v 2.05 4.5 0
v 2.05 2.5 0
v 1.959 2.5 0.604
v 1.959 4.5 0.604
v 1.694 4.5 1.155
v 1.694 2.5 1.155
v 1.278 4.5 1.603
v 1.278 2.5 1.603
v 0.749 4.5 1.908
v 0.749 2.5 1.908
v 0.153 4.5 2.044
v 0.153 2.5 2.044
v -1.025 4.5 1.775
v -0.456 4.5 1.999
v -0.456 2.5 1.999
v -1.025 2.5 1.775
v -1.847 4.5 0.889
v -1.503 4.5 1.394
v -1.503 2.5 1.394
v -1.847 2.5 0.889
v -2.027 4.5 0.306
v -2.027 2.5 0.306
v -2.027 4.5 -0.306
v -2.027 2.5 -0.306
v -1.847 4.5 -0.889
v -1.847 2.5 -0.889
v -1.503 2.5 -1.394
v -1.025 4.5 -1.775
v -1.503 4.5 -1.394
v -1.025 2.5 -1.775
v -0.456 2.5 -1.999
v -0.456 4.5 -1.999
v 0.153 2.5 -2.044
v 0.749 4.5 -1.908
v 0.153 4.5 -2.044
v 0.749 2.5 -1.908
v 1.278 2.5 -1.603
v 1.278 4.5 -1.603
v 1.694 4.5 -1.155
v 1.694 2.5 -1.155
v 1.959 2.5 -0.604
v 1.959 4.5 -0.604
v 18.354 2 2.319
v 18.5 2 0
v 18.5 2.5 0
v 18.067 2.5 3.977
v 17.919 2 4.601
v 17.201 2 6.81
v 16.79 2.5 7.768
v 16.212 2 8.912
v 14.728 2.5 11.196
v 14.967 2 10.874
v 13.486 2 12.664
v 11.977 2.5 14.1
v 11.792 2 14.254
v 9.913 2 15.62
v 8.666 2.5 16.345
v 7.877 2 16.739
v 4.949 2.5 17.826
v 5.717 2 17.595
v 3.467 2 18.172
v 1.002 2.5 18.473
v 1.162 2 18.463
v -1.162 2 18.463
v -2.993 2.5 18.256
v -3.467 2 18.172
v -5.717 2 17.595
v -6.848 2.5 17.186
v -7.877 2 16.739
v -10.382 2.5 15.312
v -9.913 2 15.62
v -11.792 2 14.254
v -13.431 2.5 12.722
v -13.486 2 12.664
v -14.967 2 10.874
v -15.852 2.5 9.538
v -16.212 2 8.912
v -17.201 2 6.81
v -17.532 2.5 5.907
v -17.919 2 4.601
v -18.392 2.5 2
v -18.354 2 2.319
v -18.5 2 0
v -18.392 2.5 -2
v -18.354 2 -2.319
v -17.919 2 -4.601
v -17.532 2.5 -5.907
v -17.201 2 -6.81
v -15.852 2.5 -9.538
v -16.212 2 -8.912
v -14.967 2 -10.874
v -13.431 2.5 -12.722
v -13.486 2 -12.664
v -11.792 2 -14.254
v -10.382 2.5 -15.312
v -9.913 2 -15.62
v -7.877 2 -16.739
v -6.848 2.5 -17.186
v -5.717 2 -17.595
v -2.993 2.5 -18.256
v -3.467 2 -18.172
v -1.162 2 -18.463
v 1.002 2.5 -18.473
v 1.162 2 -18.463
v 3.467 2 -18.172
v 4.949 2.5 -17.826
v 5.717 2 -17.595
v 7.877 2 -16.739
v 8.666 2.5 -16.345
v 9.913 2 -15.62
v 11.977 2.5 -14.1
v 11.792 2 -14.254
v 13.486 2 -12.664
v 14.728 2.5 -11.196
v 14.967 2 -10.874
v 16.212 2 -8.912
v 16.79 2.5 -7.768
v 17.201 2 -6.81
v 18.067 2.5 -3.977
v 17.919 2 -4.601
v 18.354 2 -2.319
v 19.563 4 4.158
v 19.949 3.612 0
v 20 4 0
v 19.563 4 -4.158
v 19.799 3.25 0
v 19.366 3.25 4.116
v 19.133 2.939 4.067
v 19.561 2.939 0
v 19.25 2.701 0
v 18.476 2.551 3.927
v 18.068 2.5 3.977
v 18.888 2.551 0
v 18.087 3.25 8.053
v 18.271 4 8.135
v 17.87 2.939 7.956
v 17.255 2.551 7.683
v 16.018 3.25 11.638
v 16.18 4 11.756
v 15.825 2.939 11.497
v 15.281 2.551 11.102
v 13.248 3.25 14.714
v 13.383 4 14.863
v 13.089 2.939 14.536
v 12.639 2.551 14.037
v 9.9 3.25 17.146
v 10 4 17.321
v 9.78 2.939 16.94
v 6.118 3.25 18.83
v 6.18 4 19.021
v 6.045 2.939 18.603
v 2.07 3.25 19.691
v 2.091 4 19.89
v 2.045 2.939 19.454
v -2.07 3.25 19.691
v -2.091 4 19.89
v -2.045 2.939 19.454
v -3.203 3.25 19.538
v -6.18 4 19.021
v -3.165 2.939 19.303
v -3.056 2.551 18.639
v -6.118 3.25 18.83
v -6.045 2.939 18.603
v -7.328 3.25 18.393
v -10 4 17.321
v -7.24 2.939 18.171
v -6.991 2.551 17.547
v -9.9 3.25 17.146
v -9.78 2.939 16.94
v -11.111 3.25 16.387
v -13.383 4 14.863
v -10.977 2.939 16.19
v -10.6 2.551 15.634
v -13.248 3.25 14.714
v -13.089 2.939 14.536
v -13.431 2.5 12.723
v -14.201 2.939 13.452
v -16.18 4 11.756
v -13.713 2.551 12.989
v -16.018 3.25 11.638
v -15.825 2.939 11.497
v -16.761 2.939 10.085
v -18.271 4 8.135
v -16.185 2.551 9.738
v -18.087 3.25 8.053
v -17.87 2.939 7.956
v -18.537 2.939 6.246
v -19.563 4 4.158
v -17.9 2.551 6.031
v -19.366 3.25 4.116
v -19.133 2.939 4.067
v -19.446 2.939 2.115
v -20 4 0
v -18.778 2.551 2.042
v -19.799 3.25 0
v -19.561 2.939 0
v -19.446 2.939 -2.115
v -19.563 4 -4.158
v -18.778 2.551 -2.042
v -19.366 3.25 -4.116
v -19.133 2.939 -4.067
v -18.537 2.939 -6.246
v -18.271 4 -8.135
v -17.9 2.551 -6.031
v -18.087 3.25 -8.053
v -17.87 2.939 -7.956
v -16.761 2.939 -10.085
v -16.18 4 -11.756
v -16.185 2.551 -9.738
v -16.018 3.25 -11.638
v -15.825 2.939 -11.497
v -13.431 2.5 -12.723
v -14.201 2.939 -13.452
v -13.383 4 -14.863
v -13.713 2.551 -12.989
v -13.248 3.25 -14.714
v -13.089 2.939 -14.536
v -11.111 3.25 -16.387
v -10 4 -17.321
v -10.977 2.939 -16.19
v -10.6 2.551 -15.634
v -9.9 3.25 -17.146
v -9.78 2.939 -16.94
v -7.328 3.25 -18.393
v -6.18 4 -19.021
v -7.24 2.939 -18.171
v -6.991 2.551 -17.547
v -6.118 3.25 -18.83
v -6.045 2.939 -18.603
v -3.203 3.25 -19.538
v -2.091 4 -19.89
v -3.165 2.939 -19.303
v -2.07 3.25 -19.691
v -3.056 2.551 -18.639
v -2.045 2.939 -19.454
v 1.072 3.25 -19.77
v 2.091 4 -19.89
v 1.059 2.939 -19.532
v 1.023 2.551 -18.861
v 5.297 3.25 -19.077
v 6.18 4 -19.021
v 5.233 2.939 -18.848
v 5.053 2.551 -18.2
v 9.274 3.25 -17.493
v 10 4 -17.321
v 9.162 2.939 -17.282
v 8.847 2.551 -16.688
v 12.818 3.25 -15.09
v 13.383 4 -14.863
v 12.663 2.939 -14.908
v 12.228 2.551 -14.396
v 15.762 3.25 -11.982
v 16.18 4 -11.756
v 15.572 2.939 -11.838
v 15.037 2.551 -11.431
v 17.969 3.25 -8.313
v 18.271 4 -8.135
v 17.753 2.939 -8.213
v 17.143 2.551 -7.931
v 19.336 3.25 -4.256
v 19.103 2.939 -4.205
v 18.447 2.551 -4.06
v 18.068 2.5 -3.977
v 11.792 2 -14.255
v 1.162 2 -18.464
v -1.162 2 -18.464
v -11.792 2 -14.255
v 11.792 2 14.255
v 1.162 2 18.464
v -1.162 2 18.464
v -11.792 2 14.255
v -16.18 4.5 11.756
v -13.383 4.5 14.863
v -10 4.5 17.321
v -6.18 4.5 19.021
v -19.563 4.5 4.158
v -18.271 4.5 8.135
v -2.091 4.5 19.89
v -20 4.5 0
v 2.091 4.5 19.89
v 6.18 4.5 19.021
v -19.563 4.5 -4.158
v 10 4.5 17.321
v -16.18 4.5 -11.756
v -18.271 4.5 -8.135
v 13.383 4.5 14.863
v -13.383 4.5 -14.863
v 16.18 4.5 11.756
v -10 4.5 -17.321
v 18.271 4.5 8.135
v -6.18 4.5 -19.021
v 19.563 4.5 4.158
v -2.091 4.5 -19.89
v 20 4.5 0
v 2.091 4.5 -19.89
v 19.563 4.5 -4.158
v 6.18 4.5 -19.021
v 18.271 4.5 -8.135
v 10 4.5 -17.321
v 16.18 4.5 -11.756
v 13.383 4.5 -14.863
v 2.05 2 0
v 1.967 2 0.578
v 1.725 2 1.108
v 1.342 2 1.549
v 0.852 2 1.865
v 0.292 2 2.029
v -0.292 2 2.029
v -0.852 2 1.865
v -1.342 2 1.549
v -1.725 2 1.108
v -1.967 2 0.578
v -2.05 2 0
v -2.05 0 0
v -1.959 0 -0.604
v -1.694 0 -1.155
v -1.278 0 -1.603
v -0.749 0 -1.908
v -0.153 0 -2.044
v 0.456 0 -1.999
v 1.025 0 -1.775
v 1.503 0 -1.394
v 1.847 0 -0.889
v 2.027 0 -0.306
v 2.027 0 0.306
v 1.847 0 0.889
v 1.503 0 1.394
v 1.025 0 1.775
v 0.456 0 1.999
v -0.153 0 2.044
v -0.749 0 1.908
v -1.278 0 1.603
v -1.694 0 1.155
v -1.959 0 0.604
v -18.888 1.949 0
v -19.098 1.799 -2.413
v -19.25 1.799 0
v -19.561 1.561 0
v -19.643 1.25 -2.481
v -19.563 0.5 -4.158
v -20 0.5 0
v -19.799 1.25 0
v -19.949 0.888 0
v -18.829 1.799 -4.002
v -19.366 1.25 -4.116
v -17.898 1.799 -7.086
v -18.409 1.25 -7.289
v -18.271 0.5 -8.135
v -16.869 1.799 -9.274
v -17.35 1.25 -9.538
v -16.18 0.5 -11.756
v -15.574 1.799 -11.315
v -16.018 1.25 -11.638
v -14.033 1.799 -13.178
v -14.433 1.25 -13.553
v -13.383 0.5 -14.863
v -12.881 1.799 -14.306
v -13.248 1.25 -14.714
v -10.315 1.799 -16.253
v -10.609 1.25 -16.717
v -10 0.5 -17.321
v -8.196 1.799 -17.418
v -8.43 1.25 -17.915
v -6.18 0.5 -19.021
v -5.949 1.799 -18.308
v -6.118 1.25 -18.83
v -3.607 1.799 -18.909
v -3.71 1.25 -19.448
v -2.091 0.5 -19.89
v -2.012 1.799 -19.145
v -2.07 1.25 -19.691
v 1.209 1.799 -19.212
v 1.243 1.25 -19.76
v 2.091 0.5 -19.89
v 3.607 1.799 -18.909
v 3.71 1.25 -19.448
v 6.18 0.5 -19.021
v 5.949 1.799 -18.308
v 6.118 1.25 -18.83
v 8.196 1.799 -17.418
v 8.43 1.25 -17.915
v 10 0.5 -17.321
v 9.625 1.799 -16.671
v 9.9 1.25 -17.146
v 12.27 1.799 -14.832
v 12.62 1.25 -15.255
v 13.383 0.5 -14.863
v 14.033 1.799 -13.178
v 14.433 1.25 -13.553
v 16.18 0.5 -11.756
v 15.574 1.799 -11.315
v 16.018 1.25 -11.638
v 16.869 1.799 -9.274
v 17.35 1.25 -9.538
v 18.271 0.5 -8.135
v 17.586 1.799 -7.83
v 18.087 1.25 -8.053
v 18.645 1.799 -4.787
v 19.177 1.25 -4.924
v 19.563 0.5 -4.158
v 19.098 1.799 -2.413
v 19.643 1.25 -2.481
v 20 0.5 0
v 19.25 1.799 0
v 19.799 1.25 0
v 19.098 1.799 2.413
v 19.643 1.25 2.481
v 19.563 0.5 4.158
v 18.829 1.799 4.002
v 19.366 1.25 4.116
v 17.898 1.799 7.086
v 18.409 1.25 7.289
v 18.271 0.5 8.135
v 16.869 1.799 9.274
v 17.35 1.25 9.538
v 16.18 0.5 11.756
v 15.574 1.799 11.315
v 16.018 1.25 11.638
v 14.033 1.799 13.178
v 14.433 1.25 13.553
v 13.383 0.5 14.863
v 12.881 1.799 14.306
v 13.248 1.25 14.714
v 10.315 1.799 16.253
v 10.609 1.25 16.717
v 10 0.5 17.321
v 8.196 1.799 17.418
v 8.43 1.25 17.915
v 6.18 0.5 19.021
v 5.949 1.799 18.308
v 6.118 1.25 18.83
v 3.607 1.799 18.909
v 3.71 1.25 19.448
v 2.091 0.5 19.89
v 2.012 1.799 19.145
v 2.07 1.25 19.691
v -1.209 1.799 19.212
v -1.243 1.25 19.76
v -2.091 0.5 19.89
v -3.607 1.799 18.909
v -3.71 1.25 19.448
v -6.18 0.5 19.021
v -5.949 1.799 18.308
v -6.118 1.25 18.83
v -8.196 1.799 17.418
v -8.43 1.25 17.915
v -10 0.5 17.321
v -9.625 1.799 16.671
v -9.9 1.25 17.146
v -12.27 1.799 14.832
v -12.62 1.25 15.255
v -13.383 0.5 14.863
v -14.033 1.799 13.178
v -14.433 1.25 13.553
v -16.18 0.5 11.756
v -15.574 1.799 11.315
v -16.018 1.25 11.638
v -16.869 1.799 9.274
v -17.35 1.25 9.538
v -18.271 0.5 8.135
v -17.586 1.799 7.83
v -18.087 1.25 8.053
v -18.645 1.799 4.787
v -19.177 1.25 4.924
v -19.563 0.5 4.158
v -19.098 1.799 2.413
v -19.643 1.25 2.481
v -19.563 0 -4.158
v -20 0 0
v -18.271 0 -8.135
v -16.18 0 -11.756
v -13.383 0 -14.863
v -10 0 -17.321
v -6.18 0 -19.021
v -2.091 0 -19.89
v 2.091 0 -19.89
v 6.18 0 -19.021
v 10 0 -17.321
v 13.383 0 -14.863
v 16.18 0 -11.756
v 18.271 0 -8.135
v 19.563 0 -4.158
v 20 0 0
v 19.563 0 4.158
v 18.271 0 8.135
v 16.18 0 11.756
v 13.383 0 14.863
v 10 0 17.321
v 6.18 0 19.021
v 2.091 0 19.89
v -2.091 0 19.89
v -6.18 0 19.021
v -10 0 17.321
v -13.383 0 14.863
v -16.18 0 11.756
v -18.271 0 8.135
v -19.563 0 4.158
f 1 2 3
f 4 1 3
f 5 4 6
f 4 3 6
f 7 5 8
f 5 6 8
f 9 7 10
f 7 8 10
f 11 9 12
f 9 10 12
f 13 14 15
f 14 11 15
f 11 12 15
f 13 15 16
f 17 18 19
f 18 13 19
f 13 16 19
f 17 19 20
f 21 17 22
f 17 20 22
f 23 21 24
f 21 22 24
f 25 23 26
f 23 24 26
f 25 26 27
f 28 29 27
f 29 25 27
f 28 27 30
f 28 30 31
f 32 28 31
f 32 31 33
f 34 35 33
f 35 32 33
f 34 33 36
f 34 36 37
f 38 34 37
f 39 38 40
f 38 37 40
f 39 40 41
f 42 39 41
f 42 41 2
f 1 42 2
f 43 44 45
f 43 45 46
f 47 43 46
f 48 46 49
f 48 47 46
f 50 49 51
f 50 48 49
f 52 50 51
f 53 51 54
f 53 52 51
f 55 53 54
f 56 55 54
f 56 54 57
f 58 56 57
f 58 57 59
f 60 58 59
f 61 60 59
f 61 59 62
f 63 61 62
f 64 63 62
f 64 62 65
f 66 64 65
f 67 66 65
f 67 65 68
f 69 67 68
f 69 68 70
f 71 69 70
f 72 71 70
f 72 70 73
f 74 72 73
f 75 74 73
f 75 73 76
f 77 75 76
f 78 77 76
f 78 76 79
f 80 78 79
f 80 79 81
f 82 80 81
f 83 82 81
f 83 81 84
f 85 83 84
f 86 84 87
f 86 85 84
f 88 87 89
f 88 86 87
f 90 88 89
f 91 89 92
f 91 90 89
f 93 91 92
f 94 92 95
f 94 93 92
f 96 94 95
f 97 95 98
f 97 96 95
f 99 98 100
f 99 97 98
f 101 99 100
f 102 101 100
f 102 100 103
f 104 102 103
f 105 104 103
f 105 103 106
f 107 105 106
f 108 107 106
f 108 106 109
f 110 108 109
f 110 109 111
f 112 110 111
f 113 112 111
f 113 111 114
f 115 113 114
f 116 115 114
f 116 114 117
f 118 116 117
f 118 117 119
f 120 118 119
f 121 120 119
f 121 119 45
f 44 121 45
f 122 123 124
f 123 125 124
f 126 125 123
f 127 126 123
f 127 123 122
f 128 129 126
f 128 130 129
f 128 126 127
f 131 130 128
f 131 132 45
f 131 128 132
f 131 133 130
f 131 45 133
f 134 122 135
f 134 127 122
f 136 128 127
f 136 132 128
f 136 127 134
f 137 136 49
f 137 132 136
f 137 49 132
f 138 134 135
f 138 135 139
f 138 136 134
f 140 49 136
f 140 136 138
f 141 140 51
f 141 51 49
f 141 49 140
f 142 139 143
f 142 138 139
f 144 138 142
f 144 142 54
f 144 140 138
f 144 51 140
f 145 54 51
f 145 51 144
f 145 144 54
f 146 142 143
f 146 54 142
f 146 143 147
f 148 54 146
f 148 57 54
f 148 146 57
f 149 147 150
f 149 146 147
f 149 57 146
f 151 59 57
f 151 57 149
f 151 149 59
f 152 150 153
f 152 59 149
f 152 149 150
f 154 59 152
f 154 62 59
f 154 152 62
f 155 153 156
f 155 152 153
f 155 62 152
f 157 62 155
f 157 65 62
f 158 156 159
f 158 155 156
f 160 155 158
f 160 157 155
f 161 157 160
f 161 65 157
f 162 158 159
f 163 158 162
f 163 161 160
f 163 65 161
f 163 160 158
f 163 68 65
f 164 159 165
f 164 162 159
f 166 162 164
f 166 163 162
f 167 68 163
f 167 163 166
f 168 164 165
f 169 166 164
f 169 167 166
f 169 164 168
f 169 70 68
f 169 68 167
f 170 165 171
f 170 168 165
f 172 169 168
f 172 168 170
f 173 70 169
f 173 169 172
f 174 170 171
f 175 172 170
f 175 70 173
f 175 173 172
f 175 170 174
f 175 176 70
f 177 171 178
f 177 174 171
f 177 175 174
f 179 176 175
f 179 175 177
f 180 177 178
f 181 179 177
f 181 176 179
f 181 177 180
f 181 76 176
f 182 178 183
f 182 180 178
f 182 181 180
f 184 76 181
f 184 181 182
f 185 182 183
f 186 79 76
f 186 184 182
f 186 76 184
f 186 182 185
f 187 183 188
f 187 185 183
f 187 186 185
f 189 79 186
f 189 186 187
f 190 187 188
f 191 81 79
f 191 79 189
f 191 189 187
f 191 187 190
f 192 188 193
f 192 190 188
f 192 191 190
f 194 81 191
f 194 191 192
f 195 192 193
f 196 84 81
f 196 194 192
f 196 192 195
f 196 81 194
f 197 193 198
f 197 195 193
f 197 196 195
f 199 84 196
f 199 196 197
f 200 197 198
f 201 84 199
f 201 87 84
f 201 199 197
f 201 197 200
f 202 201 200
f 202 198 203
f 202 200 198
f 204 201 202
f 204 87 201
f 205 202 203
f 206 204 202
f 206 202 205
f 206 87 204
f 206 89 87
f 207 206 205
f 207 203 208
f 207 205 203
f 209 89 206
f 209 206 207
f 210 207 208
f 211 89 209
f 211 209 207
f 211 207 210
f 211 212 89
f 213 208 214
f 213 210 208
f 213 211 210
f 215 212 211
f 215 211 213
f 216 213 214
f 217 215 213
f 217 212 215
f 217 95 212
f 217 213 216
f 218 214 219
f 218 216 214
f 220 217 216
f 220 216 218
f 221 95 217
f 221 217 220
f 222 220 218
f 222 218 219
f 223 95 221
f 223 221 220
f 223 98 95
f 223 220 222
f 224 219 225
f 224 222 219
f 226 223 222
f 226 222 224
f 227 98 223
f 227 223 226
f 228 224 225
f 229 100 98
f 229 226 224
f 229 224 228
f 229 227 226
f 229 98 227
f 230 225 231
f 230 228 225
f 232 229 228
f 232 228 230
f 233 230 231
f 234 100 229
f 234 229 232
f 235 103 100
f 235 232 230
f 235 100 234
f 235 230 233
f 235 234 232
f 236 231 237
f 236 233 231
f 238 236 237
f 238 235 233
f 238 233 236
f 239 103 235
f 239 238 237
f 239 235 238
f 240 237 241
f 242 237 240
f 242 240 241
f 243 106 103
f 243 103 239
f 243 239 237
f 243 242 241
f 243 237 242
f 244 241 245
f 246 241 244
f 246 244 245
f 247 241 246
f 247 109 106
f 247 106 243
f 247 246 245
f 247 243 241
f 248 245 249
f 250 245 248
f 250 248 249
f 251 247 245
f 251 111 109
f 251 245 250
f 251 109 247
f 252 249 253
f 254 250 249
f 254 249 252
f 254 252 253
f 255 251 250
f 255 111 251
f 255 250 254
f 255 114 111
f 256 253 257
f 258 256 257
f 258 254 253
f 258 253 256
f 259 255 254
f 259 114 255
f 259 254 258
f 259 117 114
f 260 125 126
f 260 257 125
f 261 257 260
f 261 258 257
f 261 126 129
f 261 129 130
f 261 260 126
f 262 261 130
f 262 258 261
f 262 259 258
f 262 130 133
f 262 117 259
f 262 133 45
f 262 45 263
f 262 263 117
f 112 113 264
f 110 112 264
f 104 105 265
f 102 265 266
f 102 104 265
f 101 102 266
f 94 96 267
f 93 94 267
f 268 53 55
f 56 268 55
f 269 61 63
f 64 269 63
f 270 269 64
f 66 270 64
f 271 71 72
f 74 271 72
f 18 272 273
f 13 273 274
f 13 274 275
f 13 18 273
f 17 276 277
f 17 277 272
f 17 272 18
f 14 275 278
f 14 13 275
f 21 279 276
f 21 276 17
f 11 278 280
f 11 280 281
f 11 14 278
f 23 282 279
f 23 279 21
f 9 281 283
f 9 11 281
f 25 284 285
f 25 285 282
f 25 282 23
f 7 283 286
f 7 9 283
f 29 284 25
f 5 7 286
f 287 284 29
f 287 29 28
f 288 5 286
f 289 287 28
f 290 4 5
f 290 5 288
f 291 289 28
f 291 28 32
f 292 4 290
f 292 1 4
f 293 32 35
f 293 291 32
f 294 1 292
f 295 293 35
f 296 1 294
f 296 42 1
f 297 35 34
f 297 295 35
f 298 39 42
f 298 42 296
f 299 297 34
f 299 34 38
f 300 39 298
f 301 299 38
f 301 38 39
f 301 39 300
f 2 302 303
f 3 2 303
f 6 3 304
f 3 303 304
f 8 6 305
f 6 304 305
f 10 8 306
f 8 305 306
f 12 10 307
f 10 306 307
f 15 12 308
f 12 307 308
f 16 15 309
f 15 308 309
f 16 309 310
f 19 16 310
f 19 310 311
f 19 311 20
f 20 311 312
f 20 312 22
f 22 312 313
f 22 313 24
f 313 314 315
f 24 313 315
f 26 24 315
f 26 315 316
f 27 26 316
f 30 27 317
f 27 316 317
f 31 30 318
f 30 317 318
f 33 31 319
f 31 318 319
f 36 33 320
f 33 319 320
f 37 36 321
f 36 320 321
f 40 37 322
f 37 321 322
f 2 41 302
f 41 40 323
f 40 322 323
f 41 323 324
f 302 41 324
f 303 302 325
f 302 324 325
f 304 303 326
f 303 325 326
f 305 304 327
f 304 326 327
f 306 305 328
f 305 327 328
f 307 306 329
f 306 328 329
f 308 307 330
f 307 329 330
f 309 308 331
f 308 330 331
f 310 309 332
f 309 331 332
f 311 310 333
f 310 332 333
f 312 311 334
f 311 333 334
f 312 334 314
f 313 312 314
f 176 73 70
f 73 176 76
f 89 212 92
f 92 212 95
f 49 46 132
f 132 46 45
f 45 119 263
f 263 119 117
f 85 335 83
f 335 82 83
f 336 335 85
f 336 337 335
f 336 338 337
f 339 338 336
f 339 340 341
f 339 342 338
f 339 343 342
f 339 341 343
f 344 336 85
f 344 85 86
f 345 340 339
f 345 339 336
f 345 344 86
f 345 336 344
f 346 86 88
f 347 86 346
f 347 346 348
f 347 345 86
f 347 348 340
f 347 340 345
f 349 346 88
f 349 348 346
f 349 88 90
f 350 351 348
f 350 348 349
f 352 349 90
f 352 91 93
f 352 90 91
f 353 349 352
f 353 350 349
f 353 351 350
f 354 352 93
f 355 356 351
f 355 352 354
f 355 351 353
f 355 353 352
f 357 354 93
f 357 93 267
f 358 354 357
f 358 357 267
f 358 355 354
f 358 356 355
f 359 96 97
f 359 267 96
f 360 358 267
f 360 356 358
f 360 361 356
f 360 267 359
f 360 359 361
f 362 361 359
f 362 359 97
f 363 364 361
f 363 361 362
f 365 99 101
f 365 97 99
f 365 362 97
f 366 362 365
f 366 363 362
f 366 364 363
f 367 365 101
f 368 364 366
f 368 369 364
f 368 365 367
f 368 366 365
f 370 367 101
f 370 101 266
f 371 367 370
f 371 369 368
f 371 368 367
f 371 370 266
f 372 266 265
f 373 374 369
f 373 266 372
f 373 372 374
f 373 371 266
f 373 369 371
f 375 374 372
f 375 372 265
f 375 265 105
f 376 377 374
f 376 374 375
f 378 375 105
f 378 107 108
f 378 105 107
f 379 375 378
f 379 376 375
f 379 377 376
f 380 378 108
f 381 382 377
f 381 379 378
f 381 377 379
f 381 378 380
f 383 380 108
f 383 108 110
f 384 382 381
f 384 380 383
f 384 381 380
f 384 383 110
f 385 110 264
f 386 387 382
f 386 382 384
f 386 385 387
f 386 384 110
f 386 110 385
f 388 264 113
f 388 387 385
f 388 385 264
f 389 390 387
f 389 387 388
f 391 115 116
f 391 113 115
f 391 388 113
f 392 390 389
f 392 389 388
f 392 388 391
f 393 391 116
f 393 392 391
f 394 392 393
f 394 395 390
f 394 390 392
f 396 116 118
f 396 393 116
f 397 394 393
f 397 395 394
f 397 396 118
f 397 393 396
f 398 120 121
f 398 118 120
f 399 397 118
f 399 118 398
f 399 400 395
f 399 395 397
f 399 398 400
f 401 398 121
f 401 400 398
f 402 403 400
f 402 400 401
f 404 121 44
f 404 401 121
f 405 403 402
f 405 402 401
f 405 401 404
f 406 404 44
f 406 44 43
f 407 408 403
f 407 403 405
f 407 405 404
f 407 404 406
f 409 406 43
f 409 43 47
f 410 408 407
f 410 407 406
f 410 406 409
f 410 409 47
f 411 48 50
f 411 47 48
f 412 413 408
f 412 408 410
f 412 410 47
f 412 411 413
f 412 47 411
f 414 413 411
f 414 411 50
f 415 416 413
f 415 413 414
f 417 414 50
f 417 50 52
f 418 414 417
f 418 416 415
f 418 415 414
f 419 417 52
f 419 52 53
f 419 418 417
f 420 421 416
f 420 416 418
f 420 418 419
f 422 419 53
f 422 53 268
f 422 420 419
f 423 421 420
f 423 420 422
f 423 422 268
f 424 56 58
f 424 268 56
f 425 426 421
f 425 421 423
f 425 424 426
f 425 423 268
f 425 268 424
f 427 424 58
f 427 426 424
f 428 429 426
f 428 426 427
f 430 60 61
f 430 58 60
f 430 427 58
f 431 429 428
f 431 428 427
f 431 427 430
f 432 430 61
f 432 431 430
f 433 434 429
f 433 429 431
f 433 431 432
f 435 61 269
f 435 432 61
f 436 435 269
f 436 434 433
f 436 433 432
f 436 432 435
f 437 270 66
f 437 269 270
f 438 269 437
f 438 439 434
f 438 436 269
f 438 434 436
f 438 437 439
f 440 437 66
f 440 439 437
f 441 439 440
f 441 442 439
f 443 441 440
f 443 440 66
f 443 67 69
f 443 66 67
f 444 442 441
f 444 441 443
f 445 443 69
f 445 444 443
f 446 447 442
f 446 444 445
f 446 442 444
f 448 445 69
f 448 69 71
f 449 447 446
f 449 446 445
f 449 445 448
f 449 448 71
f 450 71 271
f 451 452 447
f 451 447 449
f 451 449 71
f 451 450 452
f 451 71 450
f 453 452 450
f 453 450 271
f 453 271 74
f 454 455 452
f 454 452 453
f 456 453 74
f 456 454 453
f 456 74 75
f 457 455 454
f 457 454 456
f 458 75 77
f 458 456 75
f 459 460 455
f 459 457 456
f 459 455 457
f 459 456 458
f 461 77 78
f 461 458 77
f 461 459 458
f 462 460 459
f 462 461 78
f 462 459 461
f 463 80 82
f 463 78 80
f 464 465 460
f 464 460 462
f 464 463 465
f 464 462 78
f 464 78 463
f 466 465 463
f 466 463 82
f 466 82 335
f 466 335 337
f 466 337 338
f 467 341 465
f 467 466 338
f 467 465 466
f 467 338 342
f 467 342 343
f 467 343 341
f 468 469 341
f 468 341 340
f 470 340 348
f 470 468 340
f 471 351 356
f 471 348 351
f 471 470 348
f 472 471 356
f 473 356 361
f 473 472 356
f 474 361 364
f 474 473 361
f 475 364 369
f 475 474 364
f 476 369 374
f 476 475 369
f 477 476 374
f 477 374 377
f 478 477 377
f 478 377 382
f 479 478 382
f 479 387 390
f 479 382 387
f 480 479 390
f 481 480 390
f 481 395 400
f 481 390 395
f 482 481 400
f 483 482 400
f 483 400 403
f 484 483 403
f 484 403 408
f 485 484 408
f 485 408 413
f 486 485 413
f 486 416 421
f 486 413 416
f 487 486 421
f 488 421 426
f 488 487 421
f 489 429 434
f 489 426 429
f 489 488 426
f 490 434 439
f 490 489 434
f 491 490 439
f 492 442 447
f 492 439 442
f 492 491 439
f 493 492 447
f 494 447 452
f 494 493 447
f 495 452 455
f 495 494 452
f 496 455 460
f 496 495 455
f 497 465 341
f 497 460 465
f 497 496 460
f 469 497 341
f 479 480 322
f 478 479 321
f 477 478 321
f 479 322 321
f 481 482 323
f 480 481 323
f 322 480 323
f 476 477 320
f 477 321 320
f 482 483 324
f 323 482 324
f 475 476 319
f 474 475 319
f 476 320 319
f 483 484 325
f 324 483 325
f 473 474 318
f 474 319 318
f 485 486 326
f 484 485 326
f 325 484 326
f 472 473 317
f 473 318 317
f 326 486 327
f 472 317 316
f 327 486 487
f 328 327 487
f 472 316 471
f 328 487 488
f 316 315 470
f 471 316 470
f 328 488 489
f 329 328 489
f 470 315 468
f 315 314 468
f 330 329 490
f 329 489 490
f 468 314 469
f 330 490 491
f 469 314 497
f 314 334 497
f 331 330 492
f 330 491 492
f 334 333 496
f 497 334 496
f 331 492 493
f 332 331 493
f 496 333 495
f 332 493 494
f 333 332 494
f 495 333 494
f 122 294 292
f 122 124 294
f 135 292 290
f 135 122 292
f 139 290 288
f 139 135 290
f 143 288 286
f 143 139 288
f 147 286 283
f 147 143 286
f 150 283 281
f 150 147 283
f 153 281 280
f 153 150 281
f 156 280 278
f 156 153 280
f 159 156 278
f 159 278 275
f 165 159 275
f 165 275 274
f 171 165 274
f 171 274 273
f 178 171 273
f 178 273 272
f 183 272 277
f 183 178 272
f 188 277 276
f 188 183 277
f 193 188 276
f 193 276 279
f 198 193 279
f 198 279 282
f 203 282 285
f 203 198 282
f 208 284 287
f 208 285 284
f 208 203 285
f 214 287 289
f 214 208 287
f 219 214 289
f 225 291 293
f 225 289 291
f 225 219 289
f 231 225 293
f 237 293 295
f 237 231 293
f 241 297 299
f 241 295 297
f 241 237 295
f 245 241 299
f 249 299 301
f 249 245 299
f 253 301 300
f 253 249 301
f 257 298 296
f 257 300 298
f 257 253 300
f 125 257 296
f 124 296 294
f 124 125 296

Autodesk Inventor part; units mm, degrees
ref_plane "YZ Plane" through (0, 0, 0) normal (1, 0, 0) x (0, 1, 0)
ref_plane "XZ Plane" through (0, 0, 0) normal (0, 1, 0) x (-1, 0, 0)
ref_plane "XY Plane" through (0, 0, 0) normal (0, 0, 1) x (1, 0, 0)
sketch "Sketch1" plane through (0, 0, 0) normal (0, 1, 0) x (-1, 0, 0)
  circle A0 centre (0, 0) radius 20
  circle A1 centre (0, 0) radius 2.05
  dimension "d0" = 40
  dimension "d1" = 4.1
extrude "Extrusion1" add sketch "Sketch1" along normal blind 2
sketch "Sketch2" plane through (0, 2, 0) normal (0, 1, 0) x (1, 0, 0)
  circle A0 centre (0, 0) radius 18.5
  circle A1 centre (0, 0) radius 2.0967
  circle A2 centre (0, 0) radius 2.05
  dimension "d4" = 37
extrude "Extrusion2" add sketch "Sketch2" along normal blind 0.5 contours A0 | A1
sketch "Sketch3" plane through (0, 2.5, 0) normal (0, 1, 0) x (1, 0, 0)
  circle A0 centre (0, 0) radius 2.05
  circle A1 centre (0, 0) radius 20
extrude "Extrusion3" add sketch "Sketch3" along normal blind 2
fillet "Fillet1" radius 1.5 2 edges at (20, 2, 0) (-20, 2.5, 0)
properties part number "Raket_Hjul"
